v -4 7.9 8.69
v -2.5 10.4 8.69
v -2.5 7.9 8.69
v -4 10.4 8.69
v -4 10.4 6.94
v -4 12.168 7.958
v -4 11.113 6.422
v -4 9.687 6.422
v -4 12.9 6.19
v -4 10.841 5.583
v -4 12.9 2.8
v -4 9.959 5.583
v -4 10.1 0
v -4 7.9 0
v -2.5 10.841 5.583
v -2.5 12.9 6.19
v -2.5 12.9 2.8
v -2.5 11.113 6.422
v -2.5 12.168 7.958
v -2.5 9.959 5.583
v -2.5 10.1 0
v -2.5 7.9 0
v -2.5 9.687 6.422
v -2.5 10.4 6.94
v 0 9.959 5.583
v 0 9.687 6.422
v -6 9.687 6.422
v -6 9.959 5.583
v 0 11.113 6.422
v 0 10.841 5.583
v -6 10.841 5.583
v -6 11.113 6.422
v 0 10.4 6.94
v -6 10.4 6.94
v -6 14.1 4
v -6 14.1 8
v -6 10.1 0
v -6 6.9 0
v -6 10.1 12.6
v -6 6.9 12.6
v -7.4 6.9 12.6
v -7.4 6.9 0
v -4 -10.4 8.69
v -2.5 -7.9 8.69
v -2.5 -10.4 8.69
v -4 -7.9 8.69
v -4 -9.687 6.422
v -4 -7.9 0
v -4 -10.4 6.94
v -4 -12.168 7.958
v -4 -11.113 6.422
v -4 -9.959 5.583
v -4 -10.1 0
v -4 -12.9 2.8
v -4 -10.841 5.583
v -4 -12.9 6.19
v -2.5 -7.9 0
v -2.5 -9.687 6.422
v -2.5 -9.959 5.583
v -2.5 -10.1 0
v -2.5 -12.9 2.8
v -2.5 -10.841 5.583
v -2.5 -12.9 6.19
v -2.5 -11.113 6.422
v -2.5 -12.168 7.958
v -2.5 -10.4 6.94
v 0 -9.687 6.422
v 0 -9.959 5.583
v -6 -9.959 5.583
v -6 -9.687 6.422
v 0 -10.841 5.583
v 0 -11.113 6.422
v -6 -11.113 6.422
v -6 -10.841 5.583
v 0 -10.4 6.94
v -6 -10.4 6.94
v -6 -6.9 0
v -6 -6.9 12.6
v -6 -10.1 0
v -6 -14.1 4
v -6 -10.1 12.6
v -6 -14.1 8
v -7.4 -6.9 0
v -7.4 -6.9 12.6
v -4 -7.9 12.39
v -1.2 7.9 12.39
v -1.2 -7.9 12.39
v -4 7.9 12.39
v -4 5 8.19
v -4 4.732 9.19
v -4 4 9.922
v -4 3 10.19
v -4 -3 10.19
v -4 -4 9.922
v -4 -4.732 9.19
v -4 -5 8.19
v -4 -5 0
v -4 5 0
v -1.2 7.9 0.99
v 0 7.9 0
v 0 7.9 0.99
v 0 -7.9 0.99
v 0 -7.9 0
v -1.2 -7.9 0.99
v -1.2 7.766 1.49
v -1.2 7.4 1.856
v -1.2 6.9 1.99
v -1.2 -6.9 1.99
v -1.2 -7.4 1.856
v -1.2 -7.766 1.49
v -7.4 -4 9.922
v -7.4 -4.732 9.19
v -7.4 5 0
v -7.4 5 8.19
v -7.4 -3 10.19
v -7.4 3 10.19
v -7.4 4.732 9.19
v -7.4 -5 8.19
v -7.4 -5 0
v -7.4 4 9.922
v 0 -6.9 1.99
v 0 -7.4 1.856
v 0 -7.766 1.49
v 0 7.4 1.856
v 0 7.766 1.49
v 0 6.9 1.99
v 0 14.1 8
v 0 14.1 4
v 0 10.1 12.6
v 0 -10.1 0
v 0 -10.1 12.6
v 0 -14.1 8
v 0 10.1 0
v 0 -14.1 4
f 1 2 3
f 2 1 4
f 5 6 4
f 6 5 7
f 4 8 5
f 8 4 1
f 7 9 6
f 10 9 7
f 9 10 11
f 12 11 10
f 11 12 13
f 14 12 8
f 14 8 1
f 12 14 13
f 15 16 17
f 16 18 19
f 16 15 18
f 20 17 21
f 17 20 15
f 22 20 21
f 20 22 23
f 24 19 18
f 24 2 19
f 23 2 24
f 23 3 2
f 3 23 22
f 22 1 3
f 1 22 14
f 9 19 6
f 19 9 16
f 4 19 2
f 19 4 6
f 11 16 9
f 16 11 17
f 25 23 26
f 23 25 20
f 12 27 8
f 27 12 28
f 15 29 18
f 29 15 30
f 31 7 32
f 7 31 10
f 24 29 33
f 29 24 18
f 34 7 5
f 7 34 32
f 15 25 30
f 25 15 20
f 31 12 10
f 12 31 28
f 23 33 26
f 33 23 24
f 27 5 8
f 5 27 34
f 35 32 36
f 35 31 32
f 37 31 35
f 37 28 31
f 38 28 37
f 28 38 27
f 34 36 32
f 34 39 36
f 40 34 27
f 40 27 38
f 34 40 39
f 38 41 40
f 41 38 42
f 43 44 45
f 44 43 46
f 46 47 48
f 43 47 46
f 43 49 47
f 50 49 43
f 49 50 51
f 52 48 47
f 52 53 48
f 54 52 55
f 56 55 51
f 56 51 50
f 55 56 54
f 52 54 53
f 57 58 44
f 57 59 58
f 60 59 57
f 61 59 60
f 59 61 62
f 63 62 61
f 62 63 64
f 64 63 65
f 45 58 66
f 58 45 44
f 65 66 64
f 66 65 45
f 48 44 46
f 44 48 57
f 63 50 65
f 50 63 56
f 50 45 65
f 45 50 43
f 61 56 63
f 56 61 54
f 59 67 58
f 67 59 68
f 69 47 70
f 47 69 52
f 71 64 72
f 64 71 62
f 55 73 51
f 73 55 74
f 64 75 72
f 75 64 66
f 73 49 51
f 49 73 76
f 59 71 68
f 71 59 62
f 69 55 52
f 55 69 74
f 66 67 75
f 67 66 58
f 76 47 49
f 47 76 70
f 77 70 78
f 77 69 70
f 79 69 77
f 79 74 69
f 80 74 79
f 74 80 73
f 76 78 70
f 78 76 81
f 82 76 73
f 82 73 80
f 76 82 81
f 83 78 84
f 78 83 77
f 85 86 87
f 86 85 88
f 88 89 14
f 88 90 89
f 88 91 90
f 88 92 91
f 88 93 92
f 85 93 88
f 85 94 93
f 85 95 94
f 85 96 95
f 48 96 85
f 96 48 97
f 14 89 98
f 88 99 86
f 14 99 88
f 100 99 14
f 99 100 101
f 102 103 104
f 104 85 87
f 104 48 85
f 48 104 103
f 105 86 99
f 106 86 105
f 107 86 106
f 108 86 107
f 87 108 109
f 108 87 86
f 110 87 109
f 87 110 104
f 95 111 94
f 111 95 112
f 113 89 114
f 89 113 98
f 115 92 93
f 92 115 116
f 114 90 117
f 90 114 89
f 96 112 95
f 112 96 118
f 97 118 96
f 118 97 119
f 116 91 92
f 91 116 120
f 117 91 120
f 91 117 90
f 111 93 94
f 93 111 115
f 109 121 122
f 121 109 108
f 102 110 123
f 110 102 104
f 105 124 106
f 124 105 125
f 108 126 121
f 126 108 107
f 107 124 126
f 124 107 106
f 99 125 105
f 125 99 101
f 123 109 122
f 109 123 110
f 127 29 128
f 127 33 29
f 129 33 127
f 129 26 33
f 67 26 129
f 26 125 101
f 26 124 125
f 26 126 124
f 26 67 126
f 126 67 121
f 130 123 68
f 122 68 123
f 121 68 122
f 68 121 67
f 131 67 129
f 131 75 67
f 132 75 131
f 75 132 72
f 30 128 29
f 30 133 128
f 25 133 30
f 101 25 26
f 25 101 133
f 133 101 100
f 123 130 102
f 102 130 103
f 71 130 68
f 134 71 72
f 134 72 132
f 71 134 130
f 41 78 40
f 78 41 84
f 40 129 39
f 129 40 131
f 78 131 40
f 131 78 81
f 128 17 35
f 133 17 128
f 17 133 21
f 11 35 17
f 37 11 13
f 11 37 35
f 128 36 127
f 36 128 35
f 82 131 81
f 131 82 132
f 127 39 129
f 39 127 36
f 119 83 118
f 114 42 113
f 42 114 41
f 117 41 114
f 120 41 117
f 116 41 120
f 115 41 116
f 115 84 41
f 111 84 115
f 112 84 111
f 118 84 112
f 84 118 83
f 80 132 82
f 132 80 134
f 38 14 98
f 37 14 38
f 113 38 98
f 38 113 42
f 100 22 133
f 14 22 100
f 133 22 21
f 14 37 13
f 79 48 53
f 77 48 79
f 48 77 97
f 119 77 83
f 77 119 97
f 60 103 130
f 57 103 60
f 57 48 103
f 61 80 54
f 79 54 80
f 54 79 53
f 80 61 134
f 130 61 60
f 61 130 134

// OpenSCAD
// ширина всего корпуса
width = 12.6;
// толщина корпуса
height = 7.4;
// длина
length = 28.2;


// расстояние между осями крепежных дырок
dist = (23.1+16.7)/2;
// диаметр дырки на самом приборе
d = 3.1;





// ширина платы самого дальномера
las_w = 12.4;
// длина платы дальномера (без крепежных ушек)
las_l = 15.8;
// толщина платы (без пайки и самого дальномера)
las_h = 1.5;
// толщина компонент на нижней части платы
las_bot = 1.3;
// ширина уха крепления
las_pad_w = 5;

// длина самого блока лазера
las_m_l = 10;
// ширина блока лазера
las_m_w = 10;
//
las_m_h = 5;


eps=0.01;


module laser_pad() {
  translate([-las_pad_w/2,0,0]) cube([las_pad_w,las_pad_w/2,las_h]);
  translate([0,las_pad_w/2,0]) cylinder(d=las_pad_w,h=las_h);
  
  // прорезь для вставки самого уха в держатель
  translate([-las_w/2,0,0]) cube([las_w/2,las_pad_w,las_h]);
  
  // выбранная дырка под шуруп
  translate([0,las_pad_w/2,-5]) cylinder(d=1.5,h=12);
  
  translate([-8,-1,3.5]) cube([16,9,5]);
}

module laser1() {
  
  
  // основная пластина платы
  translate([-las_w/2,-las_l/2,0]) cube([las_w,las_l,las_h]);
  
  // правые и левые опоры ушек
  translate([0,las_l/2,0]) laser_pad();
  translate([0,-las_l/2,0]) mirror([0,1,0]) laser_pad();
  translate([-las_w/2,-las_l/2,-las_bot]) cube([las_w,las_l,las_bot]);

  // вырез под лазер
  las_m_r = 2;
  hull() {
  translate([-las_w/2,-las_m_l/2,las_h]) cube([las_m_w-2*las_m_r,las_m_l,las_m_h]);
  translate([las_m_r,-las_m_l/2+las_m_r,las_h]) cylinder(r=las_m_r,h=las_m_h,$fn=12);
  translate([las_m_r,las_m_l/2-las_m_r,las_h]) cylinder(r=las_m_r,h=las_m_h,$fn=12);
  }
  
  // вырез под провода
  hull() {
  translate([-las_w/2+1,-las_l/2+1,-3]) cylinder(h=3,d=2,$fn=12);
  translate([-las_w/2,-las_l/2,-3]) cube([1,1,3]);
  translate([-las_w/2+1,las_l/2-1,-3]) cylinder(h=3,d=2,$fn=12);
  translate([-las_w/2,las_l/2-1,-3]) cube([1,1,3]);
  }
}

module laser() {
  translate([las_w/2,0,las_bot]) laser1();
}


module holder1() {
  r=4;
  hull() {
  translate([0,-length/2+r,0]) cube([width,length-r*2,height]);
  translate([r,-length/2,0]) cube([r,r,height]);
  translate([r,length/2-r,0]) cube([r,r,height]);
  }
}


module holder() {
difference() {
holder1();
translate([-eps,0,1.2]) laser();
}

}

//laser();
//holder1();
rotate(v=[0,1,0],a=-90) holder();
